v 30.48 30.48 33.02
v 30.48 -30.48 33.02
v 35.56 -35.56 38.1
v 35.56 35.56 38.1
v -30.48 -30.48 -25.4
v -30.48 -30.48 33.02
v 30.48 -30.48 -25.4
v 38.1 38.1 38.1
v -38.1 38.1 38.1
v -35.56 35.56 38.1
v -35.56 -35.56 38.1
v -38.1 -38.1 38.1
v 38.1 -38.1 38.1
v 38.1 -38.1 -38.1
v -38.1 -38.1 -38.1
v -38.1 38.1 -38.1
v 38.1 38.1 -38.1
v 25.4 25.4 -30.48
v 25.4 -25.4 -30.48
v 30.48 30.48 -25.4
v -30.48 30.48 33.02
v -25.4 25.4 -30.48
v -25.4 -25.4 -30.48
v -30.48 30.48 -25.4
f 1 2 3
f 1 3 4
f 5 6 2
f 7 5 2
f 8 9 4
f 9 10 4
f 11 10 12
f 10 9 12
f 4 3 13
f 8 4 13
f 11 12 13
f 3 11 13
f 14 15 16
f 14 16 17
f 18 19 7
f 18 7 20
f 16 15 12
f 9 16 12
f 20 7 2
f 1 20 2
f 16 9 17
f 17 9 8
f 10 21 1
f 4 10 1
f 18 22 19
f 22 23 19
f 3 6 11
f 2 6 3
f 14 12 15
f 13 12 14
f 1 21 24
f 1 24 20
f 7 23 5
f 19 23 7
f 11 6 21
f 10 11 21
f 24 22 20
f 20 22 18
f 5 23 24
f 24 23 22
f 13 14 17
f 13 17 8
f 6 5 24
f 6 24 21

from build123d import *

# Parameters (mm, degrees)
F0_W     = 76.2
F0_H     = 76.2
F1_DEPTH = 38.1
F2_DEPTH = 38.1
F3_T     = -7.62
F4_SIZE  = 5.08
F5_SIZE  = 5.08


with BuildPart() as f1:
    # F0 (on Front) → F1 (new body)
    with BuildSketch(Plane.XZ):
        Rectangle(F0_W, F0_H)
    extrude(amount=F1_DEPTH)

    # F2 (add): a face of the model
    f2_faces = [f1.faces().sort_by_distance(p)[0] for p in [
        (0, 0, 0),
    ]]
    extrude(f2_faces, amount=F2_DEPTH)

    # F3
    f3_openings = [f1.faces().sort_by_distance(p)[0] for p in [
        (0, 0, 38.1),
    ]]
    offset(amount=F3_T, openings=f3_openings)

    # F4
    f4_edges = [f1.edges().sort_by_distance(p)[0] for p in [
        (-30.48, 0, 38.1),
        (0, -30.48, 38.1),
        (0, 30.48, 38.1),
        (30.48, 0, 38.1),
    ]]
    chamfer(f4_edges, length=F4_SIZE)

    # F5
    f5_edges = [f1.edges().sort_by_distance(p)[0] for p in [
        (0, 30.48, -30.48),
        (-30.48, 0, -30.48),
        (30.48, 0, -30.48),
        (0, -30.48, -30.48),
    ]]
    chamfer(f5_edges, length=F5_SIZE)


solid = f1.part
